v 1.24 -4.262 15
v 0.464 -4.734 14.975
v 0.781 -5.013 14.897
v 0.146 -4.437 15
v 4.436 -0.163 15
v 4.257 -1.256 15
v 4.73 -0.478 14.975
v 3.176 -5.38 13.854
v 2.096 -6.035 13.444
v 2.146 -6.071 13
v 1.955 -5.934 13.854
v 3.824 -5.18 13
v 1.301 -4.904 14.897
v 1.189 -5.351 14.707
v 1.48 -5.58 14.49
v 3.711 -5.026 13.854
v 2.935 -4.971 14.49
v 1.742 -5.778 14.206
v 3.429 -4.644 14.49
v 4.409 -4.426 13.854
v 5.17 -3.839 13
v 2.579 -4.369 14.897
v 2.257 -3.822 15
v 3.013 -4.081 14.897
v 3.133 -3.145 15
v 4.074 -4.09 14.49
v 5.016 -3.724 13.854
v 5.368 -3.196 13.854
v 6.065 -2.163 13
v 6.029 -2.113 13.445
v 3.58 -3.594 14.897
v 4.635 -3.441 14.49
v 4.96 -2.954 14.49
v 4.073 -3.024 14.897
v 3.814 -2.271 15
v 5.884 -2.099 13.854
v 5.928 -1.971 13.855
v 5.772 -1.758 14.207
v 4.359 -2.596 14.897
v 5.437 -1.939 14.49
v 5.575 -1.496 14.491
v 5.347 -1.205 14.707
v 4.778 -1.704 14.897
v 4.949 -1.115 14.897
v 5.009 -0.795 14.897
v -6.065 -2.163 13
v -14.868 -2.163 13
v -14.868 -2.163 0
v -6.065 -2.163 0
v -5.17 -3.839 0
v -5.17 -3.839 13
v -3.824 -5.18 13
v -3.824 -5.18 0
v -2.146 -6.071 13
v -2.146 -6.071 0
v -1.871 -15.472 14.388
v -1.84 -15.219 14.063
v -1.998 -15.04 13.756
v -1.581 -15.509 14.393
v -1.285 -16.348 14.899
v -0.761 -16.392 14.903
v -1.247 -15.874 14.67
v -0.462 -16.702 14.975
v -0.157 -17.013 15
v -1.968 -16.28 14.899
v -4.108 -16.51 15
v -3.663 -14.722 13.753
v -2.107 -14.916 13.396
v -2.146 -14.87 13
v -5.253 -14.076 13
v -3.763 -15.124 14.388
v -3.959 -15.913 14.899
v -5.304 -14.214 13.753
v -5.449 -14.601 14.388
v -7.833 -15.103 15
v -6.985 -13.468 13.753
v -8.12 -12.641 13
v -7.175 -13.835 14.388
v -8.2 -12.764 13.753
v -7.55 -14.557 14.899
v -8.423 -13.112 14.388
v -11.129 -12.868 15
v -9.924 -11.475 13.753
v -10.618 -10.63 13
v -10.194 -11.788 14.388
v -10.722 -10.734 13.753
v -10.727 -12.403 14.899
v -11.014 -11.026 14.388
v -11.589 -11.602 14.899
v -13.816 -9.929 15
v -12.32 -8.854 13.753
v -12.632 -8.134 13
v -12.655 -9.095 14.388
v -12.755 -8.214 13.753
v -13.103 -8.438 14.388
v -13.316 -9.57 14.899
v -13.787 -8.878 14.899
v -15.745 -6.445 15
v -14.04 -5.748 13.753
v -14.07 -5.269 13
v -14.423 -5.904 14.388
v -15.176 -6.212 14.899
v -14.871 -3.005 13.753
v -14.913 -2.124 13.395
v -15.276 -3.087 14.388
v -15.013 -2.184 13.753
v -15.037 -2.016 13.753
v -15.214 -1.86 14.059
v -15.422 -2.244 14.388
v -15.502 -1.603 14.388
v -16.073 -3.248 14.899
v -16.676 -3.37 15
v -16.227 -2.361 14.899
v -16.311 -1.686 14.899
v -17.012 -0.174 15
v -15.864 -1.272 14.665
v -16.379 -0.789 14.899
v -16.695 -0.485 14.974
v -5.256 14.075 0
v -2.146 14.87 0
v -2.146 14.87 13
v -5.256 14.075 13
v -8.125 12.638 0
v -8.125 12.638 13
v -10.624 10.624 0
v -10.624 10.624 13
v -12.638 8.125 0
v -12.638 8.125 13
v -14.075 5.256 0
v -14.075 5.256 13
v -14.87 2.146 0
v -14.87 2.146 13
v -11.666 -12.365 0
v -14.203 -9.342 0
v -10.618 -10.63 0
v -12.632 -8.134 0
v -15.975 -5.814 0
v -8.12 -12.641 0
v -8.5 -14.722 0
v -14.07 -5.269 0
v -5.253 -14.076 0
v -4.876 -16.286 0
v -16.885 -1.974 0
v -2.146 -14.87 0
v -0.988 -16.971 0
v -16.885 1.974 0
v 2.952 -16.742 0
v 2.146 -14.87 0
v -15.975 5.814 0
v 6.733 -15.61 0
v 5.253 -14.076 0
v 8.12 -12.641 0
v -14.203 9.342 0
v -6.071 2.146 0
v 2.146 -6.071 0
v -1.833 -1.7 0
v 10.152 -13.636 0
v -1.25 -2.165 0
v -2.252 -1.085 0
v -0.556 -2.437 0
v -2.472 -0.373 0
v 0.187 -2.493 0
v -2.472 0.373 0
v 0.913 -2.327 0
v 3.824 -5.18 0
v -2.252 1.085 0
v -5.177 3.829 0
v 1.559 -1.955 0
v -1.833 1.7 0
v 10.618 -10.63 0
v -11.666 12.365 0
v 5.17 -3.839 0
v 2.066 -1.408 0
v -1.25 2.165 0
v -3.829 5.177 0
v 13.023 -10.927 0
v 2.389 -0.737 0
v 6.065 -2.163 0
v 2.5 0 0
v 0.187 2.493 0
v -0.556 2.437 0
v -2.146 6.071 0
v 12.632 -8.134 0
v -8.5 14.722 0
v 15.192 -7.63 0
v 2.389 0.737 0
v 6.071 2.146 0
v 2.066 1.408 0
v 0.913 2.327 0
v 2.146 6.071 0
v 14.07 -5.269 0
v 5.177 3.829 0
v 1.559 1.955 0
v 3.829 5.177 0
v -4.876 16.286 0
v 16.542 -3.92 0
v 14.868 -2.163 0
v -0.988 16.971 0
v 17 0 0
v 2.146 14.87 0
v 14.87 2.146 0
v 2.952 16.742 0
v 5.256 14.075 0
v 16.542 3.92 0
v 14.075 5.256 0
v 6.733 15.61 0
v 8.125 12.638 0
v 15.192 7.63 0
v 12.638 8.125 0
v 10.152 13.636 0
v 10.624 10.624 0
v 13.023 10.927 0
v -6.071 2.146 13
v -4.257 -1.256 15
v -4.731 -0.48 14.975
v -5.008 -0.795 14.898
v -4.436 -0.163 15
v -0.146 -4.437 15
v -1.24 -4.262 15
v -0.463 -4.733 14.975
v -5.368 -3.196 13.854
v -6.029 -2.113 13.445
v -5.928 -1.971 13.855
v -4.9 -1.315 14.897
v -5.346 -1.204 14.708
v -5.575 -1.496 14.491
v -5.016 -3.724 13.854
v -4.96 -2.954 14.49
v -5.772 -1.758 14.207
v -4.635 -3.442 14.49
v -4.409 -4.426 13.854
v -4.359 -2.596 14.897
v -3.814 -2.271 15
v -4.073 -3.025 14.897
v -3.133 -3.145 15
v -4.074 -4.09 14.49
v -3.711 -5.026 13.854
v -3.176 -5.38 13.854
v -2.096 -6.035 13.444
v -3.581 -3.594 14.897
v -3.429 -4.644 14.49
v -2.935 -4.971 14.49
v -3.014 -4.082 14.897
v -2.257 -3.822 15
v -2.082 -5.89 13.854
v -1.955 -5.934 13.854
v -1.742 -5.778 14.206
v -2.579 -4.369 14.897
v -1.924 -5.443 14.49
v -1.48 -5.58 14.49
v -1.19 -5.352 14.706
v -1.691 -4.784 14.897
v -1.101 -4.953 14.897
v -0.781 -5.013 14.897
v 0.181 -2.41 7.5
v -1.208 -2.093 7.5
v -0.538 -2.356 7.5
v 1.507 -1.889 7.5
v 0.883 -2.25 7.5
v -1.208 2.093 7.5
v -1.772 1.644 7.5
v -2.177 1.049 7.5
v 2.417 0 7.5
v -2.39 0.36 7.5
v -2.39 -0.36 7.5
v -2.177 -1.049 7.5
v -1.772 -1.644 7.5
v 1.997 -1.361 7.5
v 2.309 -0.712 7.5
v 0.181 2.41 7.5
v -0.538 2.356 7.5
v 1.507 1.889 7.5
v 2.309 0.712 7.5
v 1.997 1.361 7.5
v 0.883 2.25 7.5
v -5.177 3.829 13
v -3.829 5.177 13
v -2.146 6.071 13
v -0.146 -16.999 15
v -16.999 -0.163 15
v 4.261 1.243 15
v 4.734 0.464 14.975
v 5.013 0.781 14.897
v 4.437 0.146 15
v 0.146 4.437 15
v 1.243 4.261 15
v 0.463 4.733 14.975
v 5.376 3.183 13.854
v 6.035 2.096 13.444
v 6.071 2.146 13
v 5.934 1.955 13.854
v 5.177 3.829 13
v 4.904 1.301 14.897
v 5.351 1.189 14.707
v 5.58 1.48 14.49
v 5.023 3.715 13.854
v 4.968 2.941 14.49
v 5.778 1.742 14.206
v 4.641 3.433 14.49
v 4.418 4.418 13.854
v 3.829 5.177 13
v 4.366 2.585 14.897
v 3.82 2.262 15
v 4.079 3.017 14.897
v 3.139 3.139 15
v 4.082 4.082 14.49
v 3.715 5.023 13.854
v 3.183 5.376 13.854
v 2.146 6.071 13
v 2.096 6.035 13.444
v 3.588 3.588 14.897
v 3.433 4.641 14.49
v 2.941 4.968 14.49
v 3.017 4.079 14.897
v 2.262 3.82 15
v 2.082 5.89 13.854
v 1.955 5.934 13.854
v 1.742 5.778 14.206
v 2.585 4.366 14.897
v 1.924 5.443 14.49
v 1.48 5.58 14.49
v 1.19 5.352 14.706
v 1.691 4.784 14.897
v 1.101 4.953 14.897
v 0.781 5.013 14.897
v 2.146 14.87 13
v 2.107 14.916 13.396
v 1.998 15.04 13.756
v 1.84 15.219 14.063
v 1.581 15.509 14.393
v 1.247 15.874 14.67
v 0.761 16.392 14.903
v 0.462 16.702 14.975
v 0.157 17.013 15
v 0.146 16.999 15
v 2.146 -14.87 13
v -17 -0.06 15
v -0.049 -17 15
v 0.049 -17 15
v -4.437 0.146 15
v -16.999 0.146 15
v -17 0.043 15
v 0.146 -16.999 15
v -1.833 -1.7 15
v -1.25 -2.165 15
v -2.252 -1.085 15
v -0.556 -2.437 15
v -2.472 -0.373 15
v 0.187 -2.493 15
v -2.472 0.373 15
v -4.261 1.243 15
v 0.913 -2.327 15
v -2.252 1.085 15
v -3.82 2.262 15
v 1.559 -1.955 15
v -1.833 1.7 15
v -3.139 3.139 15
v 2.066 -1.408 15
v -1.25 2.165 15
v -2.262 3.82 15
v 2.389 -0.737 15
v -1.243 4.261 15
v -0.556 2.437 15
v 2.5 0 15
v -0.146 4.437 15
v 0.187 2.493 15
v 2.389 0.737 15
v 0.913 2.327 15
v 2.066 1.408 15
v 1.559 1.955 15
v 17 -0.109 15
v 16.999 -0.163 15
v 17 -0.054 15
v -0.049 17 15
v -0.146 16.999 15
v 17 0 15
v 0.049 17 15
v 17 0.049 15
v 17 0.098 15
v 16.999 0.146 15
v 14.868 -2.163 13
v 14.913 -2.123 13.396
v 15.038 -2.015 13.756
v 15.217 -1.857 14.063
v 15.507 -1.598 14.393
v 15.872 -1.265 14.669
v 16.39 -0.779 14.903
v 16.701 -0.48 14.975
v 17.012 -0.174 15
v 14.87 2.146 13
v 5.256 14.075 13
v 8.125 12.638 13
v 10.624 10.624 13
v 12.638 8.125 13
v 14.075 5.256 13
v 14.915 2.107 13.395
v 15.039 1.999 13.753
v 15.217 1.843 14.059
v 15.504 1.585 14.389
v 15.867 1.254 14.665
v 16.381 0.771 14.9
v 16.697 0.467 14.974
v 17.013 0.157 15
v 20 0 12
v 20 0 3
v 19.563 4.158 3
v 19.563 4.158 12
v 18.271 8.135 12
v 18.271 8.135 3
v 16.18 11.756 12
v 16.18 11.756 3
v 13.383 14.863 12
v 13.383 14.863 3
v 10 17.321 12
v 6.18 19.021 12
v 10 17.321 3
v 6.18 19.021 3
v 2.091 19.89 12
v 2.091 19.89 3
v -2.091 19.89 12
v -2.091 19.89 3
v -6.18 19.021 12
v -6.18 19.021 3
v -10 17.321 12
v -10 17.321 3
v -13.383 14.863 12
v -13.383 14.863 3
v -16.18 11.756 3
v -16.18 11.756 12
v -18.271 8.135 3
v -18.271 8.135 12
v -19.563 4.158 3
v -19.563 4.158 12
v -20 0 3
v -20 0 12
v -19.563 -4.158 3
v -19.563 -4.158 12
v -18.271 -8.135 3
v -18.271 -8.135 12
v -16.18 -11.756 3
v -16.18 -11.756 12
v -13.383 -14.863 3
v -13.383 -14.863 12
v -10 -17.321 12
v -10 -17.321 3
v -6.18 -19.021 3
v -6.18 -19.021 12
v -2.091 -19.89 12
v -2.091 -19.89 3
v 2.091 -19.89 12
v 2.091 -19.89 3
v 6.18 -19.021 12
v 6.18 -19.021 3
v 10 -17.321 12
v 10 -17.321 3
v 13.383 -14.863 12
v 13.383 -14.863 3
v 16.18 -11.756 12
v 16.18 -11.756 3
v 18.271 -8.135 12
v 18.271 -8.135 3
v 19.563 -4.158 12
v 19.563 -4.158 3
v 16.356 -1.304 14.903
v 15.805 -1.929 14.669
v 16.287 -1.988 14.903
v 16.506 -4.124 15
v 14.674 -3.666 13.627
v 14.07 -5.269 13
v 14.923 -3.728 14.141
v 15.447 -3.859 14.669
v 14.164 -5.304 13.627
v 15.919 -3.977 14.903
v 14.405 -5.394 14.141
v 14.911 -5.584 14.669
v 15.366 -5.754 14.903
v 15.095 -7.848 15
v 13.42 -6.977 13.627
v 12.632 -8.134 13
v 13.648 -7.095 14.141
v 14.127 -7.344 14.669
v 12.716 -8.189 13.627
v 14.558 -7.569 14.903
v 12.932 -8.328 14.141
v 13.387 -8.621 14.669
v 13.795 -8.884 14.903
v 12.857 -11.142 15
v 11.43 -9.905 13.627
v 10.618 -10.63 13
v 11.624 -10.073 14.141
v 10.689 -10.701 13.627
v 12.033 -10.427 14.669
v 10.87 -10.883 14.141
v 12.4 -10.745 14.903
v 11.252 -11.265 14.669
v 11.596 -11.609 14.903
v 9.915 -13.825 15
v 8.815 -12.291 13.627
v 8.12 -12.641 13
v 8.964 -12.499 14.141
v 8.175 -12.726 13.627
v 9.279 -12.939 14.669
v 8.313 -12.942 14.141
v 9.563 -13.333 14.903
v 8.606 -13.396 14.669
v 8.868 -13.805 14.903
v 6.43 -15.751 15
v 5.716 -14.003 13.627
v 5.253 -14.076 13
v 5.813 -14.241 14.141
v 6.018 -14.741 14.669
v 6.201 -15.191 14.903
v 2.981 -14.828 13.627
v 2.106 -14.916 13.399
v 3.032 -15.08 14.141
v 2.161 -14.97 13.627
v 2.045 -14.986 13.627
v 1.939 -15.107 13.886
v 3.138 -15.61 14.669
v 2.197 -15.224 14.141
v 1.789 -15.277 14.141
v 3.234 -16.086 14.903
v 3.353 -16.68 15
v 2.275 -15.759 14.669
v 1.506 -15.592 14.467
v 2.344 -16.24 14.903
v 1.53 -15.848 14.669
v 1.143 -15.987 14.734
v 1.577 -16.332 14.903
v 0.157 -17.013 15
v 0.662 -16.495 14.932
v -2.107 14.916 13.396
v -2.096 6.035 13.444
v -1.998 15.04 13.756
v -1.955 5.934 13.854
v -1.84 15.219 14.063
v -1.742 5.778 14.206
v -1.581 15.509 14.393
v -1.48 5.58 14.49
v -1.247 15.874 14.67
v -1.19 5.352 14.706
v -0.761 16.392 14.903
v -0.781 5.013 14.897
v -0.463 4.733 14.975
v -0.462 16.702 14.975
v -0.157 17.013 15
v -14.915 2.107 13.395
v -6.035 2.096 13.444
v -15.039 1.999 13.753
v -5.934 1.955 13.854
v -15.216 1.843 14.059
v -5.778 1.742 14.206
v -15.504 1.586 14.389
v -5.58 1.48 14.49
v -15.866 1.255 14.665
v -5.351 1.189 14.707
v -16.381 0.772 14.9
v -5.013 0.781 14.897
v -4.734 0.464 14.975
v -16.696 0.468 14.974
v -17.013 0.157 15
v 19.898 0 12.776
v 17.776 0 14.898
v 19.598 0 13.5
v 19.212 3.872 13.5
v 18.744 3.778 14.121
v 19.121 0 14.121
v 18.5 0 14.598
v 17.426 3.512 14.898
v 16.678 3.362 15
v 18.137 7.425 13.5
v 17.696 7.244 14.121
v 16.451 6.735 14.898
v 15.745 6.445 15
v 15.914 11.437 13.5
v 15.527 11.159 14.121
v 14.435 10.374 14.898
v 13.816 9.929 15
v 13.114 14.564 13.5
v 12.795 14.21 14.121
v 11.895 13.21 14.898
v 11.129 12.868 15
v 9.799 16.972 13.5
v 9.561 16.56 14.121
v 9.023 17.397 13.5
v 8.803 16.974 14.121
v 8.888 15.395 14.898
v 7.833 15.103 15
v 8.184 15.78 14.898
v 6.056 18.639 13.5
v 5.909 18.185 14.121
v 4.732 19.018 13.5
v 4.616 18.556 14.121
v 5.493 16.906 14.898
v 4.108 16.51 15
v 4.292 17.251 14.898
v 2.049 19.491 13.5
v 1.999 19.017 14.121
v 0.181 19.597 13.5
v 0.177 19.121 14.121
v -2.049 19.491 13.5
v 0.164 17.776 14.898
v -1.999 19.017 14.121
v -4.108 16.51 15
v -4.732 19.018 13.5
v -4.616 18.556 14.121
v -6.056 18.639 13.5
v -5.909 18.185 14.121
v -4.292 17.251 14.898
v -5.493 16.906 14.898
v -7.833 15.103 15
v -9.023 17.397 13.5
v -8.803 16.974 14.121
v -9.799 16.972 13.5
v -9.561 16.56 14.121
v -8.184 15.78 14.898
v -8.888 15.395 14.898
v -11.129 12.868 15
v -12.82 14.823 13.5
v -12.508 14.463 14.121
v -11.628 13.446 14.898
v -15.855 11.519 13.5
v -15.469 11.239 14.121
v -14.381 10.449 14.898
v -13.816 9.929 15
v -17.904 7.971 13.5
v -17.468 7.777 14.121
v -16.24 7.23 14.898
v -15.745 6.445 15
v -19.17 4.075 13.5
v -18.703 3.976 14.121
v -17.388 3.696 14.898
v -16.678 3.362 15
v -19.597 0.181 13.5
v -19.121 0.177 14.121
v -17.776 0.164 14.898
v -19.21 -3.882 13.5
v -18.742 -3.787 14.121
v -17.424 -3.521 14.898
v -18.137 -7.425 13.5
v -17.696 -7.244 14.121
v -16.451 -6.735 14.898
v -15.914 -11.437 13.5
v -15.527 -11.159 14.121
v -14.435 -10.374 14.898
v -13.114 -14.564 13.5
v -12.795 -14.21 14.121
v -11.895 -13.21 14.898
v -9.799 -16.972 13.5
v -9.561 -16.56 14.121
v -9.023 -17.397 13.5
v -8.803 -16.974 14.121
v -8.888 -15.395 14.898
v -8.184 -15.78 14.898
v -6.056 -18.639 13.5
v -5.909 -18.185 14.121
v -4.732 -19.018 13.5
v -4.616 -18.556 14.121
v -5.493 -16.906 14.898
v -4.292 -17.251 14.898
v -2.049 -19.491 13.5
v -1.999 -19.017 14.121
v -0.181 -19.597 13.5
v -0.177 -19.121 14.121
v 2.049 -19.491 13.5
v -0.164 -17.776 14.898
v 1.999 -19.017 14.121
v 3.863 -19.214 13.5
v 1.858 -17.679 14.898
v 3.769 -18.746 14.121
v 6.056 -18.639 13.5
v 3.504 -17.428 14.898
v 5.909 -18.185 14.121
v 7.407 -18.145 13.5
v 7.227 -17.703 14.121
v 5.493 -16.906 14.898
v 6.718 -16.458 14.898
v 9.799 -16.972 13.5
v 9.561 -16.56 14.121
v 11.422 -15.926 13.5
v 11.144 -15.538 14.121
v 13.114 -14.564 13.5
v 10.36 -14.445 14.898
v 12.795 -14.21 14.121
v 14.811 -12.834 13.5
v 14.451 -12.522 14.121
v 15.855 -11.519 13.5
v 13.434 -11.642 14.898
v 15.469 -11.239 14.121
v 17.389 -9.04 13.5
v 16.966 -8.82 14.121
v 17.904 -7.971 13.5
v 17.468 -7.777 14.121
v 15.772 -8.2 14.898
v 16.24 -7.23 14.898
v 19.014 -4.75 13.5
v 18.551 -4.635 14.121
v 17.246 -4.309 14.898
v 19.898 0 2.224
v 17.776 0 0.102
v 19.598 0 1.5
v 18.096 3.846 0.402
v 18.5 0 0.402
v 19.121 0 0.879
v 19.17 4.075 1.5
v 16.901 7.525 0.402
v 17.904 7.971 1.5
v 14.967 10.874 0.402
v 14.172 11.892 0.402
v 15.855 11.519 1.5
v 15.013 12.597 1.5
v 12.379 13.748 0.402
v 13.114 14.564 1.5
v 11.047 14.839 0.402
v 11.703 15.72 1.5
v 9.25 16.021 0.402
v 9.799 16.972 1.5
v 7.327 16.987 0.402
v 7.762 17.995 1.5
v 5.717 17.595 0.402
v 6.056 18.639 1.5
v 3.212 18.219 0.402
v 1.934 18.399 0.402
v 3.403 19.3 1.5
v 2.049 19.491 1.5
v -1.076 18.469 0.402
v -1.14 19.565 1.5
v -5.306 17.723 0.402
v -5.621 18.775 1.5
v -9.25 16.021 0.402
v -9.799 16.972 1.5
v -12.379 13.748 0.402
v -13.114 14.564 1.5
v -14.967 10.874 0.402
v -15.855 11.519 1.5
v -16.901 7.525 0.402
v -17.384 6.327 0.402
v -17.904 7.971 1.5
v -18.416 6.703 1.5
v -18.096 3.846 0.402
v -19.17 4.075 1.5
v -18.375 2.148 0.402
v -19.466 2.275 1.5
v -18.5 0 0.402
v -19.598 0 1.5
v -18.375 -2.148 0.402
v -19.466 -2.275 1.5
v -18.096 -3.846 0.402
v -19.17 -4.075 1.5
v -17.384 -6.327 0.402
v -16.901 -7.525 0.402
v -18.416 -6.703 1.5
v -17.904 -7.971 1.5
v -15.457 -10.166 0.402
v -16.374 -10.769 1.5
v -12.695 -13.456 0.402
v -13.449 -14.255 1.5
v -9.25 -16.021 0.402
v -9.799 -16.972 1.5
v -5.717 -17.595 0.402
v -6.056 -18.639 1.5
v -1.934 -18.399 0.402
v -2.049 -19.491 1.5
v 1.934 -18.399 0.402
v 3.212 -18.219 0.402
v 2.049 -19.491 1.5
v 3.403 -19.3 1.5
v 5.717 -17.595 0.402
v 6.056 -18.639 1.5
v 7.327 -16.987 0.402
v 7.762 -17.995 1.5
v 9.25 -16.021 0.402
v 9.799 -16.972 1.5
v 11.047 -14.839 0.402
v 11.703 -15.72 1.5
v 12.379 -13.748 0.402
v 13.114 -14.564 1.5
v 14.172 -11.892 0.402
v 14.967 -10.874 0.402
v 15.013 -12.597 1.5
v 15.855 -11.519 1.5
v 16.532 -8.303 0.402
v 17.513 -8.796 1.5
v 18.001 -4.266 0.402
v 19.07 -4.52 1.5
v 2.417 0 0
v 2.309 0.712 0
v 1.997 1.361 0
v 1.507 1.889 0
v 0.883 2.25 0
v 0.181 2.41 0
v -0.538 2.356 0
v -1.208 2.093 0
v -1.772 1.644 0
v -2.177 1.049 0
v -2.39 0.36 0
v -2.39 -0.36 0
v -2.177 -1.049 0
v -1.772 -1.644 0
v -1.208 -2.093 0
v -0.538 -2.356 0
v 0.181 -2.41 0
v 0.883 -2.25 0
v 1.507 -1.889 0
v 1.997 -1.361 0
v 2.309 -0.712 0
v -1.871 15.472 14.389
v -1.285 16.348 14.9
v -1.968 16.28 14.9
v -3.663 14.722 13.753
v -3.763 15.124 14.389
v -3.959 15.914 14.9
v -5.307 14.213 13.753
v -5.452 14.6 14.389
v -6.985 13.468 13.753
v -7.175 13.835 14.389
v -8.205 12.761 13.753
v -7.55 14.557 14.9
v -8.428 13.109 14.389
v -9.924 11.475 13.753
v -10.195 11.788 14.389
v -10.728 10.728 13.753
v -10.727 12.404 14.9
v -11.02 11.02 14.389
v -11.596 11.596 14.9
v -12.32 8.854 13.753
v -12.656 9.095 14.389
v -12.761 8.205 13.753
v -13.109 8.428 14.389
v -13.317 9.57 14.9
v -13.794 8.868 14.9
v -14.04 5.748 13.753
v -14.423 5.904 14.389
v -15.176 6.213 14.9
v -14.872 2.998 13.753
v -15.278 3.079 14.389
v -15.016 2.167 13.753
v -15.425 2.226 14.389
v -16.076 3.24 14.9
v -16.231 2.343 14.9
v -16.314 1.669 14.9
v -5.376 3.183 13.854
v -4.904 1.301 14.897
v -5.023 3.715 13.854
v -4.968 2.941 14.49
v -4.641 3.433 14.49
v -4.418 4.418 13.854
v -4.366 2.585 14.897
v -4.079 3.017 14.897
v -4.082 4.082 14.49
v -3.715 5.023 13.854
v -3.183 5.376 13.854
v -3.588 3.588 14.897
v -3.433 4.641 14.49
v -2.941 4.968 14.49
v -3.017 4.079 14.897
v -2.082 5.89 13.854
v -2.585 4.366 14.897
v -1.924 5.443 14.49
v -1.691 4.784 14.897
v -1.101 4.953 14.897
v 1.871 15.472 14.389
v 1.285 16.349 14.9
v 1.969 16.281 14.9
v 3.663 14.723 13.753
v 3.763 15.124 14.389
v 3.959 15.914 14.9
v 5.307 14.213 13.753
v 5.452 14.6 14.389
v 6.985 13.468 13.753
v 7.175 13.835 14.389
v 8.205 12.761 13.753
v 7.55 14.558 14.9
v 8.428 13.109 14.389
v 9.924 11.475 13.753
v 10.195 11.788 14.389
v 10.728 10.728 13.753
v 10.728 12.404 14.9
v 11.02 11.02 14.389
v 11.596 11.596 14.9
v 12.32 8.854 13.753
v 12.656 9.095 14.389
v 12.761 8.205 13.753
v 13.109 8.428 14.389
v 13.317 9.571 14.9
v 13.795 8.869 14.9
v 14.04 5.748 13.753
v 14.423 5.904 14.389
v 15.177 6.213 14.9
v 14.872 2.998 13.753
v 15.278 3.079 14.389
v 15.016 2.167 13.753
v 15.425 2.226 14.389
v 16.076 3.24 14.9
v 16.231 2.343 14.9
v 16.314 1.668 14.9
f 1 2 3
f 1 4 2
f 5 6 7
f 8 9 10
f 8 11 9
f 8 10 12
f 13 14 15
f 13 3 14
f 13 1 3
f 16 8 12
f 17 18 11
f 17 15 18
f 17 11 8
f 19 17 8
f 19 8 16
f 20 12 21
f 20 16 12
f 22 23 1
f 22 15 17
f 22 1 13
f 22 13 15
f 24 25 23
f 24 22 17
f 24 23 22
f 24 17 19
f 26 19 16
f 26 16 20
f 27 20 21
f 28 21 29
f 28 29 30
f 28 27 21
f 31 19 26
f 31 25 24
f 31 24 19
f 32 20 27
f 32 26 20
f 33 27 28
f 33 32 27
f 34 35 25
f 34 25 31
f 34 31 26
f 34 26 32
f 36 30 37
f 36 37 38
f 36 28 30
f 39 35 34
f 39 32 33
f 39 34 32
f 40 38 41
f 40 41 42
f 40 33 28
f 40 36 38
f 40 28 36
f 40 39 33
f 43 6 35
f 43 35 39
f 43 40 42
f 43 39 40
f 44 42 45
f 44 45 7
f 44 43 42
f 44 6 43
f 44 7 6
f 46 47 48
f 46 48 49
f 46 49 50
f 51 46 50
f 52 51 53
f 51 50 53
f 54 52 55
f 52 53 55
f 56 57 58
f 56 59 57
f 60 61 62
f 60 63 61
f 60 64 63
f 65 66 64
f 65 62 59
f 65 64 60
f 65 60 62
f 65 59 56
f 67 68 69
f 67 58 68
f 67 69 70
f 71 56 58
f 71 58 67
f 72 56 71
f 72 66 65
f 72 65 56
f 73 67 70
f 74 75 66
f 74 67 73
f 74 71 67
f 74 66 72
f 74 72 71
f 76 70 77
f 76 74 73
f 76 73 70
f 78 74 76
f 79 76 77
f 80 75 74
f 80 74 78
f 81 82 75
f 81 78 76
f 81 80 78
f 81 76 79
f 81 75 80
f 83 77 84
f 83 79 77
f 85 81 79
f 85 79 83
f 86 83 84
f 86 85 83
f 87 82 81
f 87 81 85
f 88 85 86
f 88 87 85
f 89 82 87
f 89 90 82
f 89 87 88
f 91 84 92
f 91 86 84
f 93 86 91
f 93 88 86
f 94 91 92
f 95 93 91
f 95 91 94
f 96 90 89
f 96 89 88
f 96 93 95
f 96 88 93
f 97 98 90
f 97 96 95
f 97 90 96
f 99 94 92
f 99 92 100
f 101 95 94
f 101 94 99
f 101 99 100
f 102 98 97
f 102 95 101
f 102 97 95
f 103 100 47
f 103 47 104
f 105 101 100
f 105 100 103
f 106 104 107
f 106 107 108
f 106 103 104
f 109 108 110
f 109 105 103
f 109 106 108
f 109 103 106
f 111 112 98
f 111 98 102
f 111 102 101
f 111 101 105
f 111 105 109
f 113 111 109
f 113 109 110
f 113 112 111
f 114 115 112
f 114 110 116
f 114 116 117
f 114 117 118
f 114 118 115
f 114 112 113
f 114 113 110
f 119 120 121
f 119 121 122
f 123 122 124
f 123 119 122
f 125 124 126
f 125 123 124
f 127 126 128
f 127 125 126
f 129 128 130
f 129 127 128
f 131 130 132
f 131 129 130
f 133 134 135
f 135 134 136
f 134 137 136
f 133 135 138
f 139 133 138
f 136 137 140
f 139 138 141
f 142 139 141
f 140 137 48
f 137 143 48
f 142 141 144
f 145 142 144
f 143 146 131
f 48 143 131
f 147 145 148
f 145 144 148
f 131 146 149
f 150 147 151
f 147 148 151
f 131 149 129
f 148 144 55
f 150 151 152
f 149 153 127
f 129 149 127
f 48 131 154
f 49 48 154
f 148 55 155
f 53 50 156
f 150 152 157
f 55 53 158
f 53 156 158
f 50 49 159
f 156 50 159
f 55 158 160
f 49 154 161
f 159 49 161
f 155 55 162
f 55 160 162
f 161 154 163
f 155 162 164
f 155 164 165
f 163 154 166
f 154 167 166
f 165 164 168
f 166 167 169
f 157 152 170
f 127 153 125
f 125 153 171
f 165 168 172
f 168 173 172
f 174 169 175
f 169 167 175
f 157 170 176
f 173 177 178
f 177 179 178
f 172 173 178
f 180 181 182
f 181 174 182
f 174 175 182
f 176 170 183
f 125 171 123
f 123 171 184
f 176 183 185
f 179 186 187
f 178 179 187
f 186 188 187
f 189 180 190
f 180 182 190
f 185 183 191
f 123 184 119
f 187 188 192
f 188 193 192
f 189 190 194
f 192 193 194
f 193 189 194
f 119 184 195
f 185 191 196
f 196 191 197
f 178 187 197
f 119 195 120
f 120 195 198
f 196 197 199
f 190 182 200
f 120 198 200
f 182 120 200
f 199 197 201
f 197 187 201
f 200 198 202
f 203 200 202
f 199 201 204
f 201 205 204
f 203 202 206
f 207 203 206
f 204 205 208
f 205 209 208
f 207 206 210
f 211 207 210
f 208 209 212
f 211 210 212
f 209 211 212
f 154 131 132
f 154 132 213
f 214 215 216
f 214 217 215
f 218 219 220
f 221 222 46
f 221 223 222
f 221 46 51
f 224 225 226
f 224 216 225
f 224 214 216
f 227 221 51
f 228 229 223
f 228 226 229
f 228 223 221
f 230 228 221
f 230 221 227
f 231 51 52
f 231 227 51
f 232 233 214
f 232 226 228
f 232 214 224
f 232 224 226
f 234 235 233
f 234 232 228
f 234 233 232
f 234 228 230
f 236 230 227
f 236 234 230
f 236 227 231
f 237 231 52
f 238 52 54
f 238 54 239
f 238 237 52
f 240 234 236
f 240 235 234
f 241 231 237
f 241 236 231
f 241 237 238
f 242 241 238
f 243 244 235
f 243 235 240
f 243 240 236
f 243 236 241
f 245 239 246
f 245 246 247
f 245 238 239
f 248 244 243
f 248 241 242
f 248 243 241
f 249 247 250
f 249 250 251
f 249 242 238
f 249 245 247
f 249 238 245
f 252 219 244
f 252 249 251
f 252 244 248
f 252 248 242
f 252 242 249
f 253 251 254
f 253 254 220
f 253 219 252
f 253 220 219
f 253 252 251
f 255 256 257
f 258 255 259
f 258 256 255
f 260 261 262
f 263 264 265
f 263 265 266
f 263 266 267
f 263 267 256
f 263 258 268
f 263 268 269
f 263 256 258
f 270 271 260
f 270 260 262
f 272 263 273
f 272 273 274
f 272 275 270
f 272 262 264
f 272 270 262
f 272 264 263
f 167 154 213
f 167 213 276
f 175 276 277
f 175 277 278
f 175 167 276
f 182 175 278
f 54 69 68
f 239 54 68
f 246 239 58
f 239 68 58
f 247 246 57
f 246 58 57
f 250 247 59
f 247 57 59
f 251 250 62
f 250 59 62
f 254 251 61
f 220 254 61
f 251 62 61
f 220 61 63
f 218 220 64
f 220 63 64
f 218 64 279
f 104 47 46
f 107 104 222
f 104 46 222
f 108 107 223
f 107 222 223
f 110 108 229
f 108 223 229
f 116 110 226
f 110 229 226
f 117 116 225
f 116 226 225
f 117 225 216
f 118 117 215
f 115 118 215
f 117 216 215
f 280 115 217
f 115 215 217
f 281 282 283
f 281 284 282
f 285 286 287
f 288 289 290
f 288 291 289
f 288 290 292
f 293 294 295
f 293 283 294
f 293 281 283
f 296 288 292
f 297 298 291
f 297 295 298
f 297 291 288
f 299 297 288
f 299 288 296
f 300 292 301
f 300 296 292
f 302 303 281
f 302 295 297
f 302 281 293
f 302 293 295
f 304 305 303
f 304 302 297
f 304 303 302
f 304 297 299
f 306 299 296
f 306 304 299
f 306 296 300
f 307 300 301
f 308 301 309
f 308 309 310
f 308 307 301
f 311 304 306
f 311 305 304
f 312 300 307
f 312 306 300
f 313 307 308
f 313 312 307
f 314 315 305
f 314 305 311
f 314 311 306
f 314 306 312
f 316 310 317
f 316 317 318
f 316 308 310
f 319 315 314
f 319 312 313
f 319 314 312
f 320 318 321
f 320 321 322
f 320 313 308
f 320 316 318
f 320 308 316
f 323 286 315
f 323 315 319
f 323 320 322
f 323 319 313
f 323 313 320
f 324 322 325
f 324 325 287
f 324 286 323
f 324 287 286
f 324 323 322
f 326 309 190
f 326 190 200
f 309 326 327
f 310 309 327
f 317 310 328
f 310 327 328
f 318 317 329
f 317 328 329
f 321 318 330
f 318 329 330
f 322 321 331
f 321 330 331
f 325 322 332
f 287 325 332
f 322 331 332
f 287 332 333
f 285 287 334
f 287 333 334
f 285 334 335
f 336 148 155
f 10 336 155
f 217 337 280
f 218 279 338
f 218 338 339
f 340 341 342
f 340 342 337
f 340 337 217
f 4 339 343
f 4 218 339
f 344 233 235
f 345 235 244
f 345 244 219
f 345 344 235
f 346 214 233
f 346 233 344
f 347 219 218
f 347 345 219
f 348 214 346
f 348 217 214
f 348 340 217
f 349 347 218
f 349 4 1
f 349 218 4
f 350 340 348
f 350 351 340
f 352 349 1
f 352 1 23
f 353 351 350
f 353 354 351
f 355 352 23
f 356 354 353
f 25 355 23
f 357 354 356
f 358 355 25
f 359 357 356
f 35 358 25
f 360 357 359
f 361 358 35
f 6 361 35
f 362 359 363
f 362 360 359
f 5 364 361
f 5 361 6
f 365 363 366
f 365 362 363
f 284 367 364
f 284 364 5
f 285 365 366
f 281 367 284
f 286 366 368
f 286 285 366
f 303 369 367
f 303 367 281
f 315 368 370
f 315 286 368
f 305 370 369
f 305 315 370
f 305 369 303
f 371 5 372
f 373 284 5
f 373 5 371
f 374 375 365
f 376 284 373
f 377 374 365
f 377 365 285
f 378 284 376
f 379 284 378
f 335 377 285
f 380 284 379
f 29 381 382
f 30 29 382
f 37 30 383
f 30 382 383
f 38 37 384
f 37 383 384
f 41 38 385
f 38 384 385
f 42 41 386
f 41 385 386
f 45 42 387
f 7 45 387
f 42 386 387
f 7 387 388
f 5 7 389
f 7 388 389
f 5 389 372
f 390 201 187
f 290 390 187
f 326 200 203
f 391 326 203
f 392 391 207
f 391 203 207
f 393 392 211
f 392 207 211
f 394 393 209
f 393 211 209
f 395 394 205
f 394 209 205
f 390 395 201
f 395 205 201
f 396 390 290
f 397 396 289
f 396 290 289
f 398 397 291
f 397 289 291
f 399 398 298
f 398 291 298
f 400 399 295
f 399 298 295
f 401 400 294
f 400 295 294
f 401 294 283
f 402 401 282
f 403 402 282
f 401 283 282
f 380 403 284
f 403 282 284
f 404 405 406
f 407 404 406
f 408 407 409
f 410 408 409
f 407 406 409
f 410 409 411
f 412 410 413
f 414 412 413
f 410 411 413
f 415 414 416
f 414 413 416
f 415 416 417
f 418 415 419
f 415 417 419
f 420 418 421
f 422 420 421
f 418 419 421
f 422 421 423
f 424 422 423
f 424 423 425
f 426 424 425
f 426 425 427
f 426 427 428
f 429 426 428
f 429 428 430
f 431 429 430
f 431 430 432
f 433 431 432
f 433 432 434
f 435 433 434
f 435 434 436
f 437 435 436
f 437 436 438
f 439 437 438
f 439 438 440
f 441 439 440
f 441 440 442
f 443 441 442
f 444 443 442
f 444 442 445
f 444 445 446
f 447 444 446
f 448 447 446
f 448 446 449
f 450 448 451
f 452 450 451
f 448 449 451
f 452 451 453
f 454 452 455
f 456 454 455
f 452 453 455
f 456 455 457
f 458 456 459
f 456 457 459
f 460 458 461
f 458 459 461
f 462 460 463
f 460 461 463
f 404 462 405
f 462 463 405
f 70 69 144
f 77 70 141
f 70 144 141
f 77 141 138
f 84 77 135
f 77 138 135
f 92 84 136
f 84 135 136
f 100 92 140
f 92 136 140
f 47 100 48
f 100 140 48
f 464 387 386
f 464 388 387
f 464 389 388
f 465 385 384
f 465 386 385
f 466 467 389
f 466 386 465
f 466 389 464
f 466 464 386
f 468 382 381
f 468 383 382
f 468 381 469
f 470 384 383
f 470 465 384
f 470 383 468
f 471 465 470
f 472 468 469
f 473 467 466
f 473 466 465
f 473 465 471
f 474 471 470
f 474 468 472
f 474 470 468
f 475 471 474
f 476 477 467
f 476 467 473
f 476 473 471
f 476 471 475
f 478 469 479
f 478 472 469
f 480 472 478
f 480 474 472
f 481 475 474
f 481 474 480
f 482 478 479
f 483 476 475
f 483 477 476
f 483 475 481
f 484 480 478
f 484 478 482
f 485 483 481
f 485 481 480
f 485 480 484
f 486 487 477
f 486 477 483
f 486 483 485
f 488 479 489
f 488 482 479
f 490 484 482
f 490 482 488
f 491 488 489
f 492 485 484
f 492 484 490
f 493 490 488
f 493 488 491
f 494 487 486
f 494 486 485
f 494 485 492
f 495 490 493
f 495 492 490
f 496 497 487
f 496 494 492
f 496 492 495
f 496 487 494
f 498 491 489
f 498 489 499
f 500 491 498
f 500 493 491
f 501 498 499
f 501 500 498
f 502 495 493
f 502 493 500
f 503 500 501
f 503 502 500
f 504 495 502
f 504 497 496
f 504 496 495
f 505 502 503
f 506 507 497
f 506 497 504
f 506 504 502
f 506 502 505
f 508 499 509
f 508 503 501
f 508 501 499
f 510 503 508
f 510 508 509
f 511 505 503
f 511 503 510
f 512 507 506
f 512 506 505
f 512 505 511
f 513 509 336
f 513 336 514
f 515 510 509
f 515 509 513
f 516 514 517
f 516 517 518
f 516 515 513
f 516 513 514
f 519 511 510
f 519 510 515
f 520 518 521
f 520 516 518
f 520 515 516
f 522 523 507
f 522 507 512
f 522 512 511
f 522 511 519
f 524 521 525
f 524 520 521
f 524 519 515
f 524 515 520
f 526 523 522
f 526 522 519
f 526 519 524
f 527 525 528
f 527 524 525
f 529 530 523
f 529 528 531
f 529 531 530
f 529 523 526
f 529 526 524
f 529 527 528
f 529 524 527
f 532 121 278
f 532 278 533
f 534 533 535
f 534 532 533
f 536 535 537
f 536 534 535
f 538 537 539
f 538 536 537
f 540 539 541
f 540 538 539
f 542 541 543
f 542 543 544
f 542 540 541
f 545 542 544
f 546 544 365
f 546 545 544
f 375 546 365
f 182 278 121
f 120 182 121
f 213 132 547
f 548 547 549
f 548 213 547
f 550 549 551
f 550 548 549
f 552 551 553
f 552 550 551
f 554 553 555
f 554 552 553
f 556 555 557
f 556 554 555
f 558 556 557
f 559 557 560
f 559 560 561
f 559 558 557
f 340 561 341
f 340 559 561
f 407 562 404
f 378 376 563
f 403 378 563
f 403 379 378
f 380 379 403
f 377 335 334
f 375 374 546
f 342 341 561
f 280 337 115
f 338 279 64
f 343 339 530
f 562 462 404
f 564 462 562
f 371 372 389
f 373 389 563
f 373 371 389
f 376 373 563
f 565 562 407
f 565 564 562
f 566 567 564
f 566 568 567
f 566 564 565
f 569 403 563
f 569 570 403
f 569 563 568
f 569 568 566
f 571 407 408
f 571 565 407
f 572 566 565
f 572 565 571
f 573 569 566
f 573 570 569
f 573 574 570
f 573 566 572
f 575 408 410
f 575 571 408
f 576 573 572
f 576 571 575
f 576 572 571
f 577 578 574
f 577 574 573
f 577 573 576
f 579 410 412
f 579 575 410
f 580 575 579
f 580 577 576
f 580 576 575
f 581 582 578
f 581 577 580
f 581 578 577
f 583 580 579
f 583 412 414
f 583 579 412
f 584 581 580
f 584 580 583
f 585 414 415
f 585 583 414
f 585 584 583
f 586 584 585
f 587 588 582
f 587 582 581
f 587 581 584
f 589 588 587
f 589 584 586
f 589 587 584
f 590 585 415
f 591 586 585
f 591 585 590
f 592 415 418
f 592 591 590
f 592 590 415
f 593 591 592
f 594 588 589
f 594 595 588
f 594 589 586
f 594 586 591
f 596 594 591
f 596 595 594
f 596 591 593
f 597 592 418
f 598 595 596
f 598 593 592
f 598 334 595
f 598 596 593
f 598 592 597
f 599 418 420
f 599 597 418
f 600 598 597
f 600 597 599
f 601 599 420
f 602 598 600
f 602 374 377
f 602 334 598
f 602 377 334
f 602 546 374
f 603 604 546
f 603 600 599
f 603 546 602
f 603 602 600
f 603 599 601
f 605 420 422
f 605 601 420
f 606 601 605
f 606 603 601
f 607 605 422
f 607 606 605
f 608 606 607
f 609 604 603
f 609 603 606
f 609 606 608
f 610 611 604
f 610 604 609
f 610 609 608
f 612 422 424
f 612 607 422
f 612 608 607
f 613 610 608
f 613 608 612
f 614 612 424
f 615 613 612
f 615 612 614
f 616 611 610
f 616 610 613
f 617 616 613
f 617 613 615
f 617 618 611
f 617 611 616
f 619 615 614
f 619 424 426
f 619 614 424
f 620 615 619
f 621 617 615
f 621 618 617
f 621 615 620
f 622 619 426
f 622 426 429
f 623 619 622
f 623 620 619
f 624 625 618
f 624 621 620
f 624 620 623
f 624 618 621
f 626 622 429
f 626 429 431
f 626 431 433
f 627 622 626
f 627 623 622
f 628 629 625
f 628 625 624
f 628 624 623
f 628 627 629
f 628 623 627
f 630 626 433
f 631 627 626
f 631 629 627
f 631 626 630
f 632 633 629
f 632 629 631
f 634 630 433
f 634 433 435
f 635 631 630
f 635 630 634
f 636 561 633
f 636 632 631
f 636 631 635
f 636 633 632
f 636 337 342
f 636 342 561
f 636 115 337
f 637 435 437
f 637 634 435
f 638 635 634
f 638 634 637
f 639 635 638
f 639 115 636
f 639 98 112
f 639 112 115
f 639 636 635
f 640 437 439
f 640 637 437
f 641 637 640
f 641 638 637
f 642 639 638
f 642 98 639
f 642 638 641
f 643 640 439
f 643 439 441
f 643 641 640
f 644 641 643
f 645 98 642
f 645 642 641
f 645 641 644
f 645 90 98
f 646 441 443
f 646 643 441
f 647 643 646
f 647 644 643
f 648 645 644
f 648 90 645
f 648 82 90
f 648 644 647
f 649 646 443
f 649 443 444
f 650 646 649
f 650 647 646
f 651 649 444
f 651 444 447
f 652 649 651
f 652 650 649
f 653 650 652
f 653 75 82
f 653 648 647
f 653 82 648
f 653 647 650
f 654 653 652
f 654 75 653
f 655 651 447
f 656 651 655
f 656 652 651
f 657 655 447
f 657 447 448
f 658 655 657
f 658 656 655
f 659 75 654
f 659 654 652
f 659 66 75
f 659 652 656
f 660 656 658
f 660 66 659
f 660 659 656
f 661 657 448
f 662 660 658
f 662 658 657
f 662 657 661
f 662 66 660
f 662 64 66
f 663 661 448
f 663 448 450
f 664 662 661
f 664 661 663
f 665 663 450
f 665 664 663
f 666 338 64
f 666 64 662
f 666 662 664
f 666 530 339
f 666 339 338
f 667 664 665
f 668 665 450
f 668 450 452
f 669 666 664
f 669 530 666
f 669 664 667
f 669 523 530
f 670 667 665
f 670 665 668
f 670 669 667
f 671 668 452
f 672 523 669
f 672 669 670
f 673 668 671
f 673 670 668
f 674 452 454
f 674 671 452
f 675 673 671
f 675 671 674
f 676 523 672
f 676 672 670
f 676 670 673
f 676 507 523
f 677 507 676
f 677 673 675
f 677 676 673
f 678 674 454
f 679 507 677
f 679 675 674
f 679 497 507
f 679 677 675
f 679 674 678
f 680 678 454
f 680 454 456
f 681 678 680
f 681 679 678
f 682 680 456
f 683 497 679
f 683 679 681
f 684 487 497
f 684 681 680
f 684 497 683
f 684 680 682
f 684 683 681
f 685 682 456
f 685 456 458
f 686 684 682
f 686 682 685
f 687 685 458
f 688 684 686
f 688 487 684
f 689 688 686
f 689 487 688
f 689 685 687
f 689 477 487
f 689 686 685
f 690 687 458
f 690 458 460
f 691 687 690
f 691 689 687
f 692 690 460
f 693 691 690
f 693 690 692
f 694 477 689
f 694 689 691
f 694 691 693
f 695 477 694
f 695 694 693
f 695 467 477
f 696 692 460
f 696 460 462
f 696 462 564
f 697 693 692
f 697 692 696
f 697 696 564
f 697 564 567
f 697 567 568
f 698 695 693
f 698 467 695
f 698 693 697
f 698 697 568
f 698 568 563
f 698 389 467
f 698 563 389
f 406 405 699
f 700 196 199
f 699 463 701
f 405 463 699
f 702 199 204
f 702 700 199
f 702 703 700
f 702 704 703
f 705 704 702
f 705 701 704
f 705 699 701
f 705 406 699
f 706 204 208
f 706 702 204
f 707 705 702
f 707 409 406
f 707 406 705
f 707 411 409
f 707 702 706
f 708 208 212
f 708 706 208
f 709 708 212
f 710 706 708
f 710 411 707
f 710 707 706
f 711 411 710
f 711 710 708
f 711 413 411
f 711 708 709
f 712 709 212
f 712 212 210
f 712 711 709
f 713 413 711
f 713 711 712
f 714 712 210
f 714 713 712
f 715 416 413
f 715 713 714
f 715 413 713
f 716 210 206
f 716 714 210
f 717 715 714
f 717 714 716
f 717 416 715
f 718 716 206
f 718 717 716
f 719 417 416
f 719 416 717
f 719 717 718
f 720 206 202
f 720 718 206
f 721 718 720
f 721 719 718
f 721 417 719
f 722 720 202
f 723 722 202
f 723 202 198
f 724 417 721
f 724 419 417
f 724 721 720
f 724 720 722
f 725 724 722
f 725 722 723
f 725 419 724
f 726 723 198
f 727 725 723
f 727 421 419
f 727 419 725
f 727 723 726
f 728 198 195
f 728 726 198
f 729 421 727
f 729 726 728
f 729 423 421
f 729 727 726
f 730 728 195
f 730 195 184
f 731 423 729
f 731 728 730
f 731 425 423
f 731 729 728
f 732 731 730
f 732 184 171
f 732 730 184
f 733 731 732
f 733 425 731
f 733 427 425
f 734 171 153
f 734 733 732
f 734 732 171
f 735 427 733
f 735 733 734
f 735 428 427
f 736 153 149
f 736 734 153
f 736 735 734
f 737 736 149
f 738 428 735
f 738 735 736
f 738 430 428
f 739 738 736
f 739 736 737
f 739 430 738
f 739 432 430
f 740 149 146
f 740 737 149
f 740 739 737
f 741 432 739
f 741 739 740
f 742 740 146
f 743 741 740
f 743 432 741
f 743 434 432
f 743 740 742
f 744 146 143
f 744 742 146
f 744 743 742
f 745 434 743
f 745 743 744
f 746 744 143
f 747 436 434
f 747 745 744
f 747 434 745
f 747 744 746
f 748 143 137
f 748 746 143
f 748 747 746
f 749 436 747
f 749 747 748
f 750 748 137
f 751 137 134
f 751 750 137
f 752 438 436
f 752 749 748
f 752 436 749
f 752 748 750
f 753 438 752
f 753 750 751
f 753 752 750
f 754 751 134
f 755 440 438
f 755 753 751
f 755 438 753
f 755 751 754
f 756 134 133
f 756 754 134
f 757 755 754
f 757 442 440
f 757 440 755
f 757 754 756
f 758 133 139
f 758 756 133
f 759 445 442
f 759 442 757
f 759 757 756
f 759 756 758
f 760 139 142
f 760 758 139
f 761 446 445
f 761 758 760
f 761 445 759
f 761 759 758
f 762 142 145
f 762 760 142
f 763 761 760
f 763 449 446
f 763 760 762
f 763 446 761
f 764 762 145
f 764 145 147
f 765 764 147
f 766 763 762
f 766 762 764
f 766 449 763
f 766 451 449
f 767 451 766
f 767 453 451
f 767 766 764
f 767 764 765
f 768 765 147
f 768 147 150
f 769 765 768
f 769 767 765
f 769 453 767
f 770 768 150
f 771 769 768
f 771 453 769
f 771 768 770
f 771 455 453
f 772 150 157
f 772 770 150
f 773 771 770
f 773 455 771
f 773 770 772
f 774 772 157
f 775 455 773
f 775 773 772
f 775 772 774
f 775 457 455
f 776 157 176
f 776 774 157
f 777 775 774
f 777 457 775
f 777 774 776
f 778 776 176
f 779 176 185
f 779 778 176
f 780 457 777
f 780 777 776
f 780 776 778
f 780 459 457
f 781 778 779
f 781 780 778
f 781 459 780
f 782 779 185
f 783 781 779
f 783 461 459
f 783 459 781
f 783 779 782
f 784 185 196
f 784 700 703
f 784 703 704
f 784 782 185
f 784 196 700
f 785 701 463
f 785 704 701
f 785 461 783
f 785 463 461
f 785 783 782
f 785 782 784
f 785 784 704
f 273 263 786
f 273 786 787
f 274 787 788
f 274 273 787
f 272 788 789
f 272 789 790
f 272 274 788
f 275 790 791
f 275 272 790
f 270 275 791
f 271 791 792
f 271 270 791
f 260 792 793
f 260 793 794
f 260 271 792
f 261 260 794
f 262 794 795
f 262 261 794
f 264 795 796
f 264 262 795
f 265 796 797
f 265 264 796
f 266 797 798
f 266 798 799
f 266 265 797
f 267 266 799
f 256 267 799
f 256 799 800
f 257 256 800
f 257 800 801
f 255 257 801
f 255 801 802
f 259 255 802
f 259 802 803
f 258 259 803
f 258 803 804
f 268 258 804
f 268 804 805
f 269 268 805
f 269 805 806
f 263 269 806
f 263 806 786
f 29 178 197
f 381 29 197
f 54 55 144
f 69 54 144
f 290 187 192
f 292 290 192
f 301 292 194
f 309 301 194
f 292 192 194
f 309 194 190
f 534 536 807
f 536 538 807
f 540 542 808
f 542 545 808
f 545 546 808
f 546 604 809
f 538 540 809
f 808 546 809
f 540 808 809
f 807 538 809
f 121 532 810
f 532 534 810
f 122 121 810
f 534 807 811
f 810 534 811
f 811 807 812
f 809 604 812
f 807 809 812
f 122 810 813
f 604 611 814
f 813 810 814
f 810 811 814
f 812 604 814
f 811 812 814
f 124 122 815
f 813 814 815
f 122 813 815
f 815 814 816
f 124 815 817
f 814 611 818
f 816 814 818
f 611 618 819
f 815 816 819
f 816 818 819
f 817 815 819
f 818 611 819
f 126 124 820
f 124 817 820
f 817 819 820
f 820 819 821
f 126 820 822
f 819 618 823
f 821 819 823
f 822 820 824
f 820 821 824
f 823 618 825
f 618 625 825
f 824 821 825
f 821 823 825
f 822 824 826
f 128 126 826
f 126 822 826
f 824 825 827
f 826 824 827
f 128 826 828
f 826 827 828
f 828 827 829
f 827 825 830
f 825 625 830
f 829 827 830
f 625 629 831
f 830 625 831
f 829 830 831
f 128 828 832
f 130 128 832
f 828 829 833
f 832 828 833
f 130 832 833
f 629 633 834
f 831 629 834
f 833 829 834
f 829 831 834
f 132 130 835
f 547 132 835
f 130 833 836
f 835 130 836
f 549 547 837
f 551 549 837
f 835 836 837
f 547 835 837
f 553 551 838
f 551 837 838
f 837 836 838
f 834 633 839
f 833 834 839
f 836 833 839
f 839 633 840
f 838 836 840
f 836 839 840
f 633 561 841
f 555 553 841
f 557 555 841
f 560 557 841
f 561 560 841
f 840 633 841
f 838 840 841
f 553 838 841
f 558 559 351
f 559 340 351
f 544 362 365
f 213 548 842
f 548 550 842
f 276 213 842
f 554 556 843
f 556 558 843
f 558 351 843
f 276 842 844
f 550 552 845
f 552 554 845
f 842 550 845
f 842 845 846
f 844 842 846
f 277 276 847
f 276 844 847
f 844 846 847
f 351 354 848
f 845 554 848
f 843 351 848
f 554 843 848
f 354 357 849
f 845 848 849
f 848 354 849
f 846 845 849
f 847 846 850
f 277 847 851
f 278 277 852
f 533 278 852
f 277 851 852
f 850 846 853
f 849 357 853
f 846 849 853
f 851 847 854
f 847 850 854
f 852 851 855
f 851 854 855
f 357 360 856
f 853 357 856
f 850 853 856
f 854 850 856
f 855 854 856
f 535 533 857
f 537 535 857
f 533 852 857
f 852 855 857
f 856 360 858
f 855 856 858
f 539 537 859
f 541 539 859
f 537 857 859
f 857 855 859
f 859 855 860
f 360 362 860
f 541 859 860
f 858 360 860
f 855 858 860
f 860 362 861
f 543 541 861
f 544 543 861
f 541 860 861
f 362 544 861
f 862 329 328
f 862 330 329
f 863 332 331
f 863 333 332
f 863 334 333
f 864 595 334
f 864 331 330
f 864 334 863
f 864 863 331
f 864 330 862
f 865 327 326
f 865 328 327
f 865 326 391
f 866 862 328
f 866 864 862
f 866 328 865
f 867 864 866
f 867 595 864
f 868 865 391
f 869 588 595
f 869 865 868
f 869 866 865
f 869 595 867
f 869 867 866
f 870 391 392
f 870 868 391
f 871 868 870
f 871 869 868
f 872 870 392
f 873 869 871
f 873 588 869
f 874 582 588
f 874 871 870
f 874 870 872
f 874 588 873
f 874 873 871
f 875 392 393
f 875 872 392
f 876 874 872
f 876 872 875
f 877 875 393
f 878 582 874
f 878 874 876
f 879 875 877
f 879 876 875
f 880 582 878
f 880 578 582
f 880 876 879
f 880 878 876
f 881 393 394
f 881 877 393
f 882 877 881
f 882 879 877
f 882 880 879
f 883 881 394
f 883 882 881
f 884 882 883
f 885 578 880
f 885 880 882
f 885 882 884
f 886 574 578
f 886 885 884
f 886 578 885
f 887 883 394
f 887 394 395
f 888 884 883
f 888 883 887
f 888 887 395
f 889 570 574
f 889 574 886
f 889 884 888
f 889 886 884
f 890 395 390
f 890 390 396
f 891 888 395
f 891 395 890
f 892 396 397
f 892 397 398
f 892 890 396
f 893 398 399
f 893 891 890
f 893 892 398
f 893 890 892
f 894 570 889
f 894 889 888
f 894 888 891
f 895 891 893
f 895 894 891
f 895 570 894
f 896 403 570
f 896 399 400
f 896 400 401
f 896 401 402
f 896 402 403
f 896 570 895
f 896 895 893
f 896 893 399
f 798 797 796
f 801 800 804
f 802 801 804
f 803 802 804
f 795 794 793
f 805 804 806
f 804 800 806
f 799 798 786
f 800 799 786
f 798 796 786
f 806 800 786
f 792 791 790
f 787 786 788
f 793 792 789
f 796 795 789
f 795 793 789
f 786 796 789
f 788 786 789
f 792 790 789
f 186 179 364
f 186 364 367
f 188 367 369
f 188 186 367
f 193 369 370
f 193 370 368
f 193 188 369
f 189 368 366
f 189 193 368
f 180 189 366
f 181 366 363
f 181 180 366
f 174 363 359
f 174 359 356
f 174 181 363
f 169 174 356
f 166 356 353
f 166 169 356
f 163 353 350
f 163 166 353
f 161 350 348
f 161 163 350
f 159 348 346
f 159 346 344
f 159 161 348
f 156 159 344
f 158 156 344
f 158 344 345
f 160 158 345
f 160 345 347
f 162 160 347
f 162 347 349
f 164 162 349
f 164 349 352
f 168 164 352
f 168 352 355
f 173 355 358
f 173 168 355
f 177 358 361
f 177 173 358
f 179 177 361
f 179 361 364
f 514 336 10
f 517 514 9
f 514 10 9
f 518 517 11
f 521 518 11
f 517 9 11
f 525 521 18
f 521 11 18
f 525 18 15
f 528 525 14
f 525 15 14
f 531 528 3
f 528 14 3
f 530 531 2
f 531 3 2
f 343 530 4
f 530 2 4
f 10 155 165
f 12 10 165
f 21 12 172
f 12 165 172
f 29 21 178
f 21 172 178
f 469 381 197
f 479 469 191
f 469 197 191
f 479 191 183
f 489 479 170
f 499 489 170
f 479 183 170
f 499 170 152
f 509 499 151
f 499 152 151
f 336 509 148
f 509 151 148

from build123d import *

# Parameters (mm, degrees)
SKETCH2_R           = 20
SKETCH2_R_2         = 2.5
BOSS_EXTRUDE1_DEPTH = 15
SKETCH3_R           = 2.41667892
BOSS_EXTRUDE2_DEPTH = 15
FILLET2_R           = 2
FILLET3_R           = 3
SKETCH4_R           = 2.46809762
CUT_EXTRUDE1_DEPTH  = 7.5


with BuildPart() as part:
    # Sketch2 → Boss-Extrude1 (new body)
    with BuildSketch(Plane.XY):
        Circle(SKETCH2_R)
        Circle(SKETCH2_R_2, mode=Mode.SUBTRACT)
        with BuildLine():
            Line((-2.146310324, 6.070682338), (-2.146310324, 14.870074118))
            ThreePointArc((-2.146310324, 14.870074118), (-10.623694091, 10.623694091), (-14.870074118, 2.146310324))
            Line((-14.870074118, 2.146310324), (-6.070682338, 2.146310324))
            ThreePointArc((-6.070682338, 2.146310324), (-4.553011753, 4.553011753), (-2.146310324, 6.070682338))
        make_face(mode=Mode.SUBTRACT)
        with BuildLine():
            Line((2.146310324, 6.070682338), (2.146310324, 14.870074118))
            ThreePointArc((2.146310324, 14.870074118), (10.623694091, 10.623694091), (14.870074118, 2.146310324))
            Line((14.870074118, 2.146310324), (6.070682338, 2.146310324))
            ThreePointArc((6.070682338, 2.146310324), (4.553011753, 4.553011753), (2.146310324, 6.070682338))
        make_face(mode=Mode.SUBTRACT)
        with BuildLine():
            Line((6.064732431, -2.163065556), (14.867646071, -2.163065556))
            ThreePointArc((14.867646071, -2.163065556), (10.617706659, -10.629678151), (2.146310324, -14.870074118))
            Line((2.146310324, -14.870074118), (2.146310324, -6.070682338))
            ThreePointArc((2.146310324, -6.070682338), (4.546721127, -4.5592937), (6.064732431, -2.163065556))
        make_face(mode=Mode.SUBTRACT)
        with BuildLine():
            Line((-2.146310324, -6.070682338), (-2.146310324, -14.870074118))
            ThreePointArc((-2.146310324, -14.870074118), (-10.617706659, -10.629678151), (-14.867646071, -2.163065556))
            Line((-14.867646071, -2.163065556), (-6.064732431, -2.163065556))
            ThreePointArc((-6.064732431, -2.163065556), (-4.546721127, -4.5592937), (-2.146310324, -6.070682338))
        make_face(mode=Mode.SUBTRACT)
    extrude(amount=BOSS_EXTRUDE1_DEPTH)

    # Fillet2
    fillet2_edges = [part.edges().sort_by_distance(p)[0] for p in [
        (10.470378228, 2.146310324, 15),
        (-10.470378228, 2.146310324, 15),
        (-10.623694091, 10.623694091, 15),
        (-2.146310324, 10.470378228, 15),
        (4.553011753, 4.553011753, 15),
        (2.146310324, 10.470378228, 15),
        (10.623694091, 10.623694091, 15),
        (2.146310324, -10.470378228, 15),
        (4.546721127, -4.5592937, 15),
        (10.466189251, -2.163065556, 15),
        (10.617706659, -10.629678151, 15),
        (-10.466189251, -2.163065556, 15),
        (-4.546721127, -4.5592937, 15),
        (-2.146310324, -10.470378228, 15),
        (-10.617706659, -10.629678151, 15),
        (-4.553011753, 4.553011753, 15),
    ]]
    fillet(fillet2_edges, radius=FILLET2_R)

    # Fillet3
    # the kernel refuses this fillet: 3 mm, written as the material it takes off along each edge
    with BuildSketch(Plane(origin=(0, 0, 15), x_dir=(1, 0, 0), z_dir=(0, -1, 0))) as fillet3_piece_1:
        with BuildLine():
            CenterArc((20 - FILLET3_R, -FILLET3_R), FILLET3_R, 0, 90)
            Line((20, -FILLET3_R), (20 + FILLET3_R * 0.02, -FILLET3_R))
            Line((20 + FILLET3_R * 0.02, -FILLET3_R), (20 + FILLET3_R * 0.02, FILLET3_R * 0.02))
            Line((20 + FILLET3_R * 0.02, FILLET3_R * 0.02), (20 - FILLET3_R, FILLET3_R * 0.02))
            Line((20 - FILLET3_R, FILLET3_R * 0.02), (20 - FILLET3_R, 0))
        make_face()
    revolve(axis=Axis((0, 0, 15), (0, 0, 1)), mode=Mode.SUBTRACT)
    with BuildSketch(Plane(origin=(0, 0, 0), x_dir=(1, 0, 0), z_dir=(0, -1, 0))) as fillet3_piece_2:
        with BuildLine():
            CenterArc((20 - FILLET3_R, FILLET3_R), FILLET3_R, 270, 90)
            Line((20, FILLET3_R), (20 + FILLET3_R * 0.02, FILLET3_R))
            Line((20 + FILLET3_R * 0.02, FILLET3_R), (20 + FILLET3_R * 0.02, -FILLET3_R * 0.02))
            Line((20 + FILLET3_R * 0.02, -FILLET3_R * 0.02), (20 - FILLET3_R, -FILLET3_R * 0.02))
            Line((20 - FILLET3_R, -FILLET3_R * 0.02), (20 - FILLET3_R, 0))
        make_face()
    revolve(axis=Axis((0, 0, 0), (0, 0, 1)), mode=Mode.SUBTRACT)


with BuildPart() as body_2:
    # Sketch3 → Boss-Extrude2 (new body)
    with BuildSketch(Plane.XY.offset(15)):
        Circle(SKETCH3_R)
    extrude(amount=-BOSS_EXTRUDE2_DEPTH)

    # Sketch4 → Cut-Extrude1 (cut)
    with BuildSketch(Plane.XY.offset(15)):
        Circle(SKETCH4_R)
    extrude(amount=-CUT_EXTRUDE1_DEPTH, mode=Mode.SUBTRACT)


solid = Compound([part.part, body_2.part])
